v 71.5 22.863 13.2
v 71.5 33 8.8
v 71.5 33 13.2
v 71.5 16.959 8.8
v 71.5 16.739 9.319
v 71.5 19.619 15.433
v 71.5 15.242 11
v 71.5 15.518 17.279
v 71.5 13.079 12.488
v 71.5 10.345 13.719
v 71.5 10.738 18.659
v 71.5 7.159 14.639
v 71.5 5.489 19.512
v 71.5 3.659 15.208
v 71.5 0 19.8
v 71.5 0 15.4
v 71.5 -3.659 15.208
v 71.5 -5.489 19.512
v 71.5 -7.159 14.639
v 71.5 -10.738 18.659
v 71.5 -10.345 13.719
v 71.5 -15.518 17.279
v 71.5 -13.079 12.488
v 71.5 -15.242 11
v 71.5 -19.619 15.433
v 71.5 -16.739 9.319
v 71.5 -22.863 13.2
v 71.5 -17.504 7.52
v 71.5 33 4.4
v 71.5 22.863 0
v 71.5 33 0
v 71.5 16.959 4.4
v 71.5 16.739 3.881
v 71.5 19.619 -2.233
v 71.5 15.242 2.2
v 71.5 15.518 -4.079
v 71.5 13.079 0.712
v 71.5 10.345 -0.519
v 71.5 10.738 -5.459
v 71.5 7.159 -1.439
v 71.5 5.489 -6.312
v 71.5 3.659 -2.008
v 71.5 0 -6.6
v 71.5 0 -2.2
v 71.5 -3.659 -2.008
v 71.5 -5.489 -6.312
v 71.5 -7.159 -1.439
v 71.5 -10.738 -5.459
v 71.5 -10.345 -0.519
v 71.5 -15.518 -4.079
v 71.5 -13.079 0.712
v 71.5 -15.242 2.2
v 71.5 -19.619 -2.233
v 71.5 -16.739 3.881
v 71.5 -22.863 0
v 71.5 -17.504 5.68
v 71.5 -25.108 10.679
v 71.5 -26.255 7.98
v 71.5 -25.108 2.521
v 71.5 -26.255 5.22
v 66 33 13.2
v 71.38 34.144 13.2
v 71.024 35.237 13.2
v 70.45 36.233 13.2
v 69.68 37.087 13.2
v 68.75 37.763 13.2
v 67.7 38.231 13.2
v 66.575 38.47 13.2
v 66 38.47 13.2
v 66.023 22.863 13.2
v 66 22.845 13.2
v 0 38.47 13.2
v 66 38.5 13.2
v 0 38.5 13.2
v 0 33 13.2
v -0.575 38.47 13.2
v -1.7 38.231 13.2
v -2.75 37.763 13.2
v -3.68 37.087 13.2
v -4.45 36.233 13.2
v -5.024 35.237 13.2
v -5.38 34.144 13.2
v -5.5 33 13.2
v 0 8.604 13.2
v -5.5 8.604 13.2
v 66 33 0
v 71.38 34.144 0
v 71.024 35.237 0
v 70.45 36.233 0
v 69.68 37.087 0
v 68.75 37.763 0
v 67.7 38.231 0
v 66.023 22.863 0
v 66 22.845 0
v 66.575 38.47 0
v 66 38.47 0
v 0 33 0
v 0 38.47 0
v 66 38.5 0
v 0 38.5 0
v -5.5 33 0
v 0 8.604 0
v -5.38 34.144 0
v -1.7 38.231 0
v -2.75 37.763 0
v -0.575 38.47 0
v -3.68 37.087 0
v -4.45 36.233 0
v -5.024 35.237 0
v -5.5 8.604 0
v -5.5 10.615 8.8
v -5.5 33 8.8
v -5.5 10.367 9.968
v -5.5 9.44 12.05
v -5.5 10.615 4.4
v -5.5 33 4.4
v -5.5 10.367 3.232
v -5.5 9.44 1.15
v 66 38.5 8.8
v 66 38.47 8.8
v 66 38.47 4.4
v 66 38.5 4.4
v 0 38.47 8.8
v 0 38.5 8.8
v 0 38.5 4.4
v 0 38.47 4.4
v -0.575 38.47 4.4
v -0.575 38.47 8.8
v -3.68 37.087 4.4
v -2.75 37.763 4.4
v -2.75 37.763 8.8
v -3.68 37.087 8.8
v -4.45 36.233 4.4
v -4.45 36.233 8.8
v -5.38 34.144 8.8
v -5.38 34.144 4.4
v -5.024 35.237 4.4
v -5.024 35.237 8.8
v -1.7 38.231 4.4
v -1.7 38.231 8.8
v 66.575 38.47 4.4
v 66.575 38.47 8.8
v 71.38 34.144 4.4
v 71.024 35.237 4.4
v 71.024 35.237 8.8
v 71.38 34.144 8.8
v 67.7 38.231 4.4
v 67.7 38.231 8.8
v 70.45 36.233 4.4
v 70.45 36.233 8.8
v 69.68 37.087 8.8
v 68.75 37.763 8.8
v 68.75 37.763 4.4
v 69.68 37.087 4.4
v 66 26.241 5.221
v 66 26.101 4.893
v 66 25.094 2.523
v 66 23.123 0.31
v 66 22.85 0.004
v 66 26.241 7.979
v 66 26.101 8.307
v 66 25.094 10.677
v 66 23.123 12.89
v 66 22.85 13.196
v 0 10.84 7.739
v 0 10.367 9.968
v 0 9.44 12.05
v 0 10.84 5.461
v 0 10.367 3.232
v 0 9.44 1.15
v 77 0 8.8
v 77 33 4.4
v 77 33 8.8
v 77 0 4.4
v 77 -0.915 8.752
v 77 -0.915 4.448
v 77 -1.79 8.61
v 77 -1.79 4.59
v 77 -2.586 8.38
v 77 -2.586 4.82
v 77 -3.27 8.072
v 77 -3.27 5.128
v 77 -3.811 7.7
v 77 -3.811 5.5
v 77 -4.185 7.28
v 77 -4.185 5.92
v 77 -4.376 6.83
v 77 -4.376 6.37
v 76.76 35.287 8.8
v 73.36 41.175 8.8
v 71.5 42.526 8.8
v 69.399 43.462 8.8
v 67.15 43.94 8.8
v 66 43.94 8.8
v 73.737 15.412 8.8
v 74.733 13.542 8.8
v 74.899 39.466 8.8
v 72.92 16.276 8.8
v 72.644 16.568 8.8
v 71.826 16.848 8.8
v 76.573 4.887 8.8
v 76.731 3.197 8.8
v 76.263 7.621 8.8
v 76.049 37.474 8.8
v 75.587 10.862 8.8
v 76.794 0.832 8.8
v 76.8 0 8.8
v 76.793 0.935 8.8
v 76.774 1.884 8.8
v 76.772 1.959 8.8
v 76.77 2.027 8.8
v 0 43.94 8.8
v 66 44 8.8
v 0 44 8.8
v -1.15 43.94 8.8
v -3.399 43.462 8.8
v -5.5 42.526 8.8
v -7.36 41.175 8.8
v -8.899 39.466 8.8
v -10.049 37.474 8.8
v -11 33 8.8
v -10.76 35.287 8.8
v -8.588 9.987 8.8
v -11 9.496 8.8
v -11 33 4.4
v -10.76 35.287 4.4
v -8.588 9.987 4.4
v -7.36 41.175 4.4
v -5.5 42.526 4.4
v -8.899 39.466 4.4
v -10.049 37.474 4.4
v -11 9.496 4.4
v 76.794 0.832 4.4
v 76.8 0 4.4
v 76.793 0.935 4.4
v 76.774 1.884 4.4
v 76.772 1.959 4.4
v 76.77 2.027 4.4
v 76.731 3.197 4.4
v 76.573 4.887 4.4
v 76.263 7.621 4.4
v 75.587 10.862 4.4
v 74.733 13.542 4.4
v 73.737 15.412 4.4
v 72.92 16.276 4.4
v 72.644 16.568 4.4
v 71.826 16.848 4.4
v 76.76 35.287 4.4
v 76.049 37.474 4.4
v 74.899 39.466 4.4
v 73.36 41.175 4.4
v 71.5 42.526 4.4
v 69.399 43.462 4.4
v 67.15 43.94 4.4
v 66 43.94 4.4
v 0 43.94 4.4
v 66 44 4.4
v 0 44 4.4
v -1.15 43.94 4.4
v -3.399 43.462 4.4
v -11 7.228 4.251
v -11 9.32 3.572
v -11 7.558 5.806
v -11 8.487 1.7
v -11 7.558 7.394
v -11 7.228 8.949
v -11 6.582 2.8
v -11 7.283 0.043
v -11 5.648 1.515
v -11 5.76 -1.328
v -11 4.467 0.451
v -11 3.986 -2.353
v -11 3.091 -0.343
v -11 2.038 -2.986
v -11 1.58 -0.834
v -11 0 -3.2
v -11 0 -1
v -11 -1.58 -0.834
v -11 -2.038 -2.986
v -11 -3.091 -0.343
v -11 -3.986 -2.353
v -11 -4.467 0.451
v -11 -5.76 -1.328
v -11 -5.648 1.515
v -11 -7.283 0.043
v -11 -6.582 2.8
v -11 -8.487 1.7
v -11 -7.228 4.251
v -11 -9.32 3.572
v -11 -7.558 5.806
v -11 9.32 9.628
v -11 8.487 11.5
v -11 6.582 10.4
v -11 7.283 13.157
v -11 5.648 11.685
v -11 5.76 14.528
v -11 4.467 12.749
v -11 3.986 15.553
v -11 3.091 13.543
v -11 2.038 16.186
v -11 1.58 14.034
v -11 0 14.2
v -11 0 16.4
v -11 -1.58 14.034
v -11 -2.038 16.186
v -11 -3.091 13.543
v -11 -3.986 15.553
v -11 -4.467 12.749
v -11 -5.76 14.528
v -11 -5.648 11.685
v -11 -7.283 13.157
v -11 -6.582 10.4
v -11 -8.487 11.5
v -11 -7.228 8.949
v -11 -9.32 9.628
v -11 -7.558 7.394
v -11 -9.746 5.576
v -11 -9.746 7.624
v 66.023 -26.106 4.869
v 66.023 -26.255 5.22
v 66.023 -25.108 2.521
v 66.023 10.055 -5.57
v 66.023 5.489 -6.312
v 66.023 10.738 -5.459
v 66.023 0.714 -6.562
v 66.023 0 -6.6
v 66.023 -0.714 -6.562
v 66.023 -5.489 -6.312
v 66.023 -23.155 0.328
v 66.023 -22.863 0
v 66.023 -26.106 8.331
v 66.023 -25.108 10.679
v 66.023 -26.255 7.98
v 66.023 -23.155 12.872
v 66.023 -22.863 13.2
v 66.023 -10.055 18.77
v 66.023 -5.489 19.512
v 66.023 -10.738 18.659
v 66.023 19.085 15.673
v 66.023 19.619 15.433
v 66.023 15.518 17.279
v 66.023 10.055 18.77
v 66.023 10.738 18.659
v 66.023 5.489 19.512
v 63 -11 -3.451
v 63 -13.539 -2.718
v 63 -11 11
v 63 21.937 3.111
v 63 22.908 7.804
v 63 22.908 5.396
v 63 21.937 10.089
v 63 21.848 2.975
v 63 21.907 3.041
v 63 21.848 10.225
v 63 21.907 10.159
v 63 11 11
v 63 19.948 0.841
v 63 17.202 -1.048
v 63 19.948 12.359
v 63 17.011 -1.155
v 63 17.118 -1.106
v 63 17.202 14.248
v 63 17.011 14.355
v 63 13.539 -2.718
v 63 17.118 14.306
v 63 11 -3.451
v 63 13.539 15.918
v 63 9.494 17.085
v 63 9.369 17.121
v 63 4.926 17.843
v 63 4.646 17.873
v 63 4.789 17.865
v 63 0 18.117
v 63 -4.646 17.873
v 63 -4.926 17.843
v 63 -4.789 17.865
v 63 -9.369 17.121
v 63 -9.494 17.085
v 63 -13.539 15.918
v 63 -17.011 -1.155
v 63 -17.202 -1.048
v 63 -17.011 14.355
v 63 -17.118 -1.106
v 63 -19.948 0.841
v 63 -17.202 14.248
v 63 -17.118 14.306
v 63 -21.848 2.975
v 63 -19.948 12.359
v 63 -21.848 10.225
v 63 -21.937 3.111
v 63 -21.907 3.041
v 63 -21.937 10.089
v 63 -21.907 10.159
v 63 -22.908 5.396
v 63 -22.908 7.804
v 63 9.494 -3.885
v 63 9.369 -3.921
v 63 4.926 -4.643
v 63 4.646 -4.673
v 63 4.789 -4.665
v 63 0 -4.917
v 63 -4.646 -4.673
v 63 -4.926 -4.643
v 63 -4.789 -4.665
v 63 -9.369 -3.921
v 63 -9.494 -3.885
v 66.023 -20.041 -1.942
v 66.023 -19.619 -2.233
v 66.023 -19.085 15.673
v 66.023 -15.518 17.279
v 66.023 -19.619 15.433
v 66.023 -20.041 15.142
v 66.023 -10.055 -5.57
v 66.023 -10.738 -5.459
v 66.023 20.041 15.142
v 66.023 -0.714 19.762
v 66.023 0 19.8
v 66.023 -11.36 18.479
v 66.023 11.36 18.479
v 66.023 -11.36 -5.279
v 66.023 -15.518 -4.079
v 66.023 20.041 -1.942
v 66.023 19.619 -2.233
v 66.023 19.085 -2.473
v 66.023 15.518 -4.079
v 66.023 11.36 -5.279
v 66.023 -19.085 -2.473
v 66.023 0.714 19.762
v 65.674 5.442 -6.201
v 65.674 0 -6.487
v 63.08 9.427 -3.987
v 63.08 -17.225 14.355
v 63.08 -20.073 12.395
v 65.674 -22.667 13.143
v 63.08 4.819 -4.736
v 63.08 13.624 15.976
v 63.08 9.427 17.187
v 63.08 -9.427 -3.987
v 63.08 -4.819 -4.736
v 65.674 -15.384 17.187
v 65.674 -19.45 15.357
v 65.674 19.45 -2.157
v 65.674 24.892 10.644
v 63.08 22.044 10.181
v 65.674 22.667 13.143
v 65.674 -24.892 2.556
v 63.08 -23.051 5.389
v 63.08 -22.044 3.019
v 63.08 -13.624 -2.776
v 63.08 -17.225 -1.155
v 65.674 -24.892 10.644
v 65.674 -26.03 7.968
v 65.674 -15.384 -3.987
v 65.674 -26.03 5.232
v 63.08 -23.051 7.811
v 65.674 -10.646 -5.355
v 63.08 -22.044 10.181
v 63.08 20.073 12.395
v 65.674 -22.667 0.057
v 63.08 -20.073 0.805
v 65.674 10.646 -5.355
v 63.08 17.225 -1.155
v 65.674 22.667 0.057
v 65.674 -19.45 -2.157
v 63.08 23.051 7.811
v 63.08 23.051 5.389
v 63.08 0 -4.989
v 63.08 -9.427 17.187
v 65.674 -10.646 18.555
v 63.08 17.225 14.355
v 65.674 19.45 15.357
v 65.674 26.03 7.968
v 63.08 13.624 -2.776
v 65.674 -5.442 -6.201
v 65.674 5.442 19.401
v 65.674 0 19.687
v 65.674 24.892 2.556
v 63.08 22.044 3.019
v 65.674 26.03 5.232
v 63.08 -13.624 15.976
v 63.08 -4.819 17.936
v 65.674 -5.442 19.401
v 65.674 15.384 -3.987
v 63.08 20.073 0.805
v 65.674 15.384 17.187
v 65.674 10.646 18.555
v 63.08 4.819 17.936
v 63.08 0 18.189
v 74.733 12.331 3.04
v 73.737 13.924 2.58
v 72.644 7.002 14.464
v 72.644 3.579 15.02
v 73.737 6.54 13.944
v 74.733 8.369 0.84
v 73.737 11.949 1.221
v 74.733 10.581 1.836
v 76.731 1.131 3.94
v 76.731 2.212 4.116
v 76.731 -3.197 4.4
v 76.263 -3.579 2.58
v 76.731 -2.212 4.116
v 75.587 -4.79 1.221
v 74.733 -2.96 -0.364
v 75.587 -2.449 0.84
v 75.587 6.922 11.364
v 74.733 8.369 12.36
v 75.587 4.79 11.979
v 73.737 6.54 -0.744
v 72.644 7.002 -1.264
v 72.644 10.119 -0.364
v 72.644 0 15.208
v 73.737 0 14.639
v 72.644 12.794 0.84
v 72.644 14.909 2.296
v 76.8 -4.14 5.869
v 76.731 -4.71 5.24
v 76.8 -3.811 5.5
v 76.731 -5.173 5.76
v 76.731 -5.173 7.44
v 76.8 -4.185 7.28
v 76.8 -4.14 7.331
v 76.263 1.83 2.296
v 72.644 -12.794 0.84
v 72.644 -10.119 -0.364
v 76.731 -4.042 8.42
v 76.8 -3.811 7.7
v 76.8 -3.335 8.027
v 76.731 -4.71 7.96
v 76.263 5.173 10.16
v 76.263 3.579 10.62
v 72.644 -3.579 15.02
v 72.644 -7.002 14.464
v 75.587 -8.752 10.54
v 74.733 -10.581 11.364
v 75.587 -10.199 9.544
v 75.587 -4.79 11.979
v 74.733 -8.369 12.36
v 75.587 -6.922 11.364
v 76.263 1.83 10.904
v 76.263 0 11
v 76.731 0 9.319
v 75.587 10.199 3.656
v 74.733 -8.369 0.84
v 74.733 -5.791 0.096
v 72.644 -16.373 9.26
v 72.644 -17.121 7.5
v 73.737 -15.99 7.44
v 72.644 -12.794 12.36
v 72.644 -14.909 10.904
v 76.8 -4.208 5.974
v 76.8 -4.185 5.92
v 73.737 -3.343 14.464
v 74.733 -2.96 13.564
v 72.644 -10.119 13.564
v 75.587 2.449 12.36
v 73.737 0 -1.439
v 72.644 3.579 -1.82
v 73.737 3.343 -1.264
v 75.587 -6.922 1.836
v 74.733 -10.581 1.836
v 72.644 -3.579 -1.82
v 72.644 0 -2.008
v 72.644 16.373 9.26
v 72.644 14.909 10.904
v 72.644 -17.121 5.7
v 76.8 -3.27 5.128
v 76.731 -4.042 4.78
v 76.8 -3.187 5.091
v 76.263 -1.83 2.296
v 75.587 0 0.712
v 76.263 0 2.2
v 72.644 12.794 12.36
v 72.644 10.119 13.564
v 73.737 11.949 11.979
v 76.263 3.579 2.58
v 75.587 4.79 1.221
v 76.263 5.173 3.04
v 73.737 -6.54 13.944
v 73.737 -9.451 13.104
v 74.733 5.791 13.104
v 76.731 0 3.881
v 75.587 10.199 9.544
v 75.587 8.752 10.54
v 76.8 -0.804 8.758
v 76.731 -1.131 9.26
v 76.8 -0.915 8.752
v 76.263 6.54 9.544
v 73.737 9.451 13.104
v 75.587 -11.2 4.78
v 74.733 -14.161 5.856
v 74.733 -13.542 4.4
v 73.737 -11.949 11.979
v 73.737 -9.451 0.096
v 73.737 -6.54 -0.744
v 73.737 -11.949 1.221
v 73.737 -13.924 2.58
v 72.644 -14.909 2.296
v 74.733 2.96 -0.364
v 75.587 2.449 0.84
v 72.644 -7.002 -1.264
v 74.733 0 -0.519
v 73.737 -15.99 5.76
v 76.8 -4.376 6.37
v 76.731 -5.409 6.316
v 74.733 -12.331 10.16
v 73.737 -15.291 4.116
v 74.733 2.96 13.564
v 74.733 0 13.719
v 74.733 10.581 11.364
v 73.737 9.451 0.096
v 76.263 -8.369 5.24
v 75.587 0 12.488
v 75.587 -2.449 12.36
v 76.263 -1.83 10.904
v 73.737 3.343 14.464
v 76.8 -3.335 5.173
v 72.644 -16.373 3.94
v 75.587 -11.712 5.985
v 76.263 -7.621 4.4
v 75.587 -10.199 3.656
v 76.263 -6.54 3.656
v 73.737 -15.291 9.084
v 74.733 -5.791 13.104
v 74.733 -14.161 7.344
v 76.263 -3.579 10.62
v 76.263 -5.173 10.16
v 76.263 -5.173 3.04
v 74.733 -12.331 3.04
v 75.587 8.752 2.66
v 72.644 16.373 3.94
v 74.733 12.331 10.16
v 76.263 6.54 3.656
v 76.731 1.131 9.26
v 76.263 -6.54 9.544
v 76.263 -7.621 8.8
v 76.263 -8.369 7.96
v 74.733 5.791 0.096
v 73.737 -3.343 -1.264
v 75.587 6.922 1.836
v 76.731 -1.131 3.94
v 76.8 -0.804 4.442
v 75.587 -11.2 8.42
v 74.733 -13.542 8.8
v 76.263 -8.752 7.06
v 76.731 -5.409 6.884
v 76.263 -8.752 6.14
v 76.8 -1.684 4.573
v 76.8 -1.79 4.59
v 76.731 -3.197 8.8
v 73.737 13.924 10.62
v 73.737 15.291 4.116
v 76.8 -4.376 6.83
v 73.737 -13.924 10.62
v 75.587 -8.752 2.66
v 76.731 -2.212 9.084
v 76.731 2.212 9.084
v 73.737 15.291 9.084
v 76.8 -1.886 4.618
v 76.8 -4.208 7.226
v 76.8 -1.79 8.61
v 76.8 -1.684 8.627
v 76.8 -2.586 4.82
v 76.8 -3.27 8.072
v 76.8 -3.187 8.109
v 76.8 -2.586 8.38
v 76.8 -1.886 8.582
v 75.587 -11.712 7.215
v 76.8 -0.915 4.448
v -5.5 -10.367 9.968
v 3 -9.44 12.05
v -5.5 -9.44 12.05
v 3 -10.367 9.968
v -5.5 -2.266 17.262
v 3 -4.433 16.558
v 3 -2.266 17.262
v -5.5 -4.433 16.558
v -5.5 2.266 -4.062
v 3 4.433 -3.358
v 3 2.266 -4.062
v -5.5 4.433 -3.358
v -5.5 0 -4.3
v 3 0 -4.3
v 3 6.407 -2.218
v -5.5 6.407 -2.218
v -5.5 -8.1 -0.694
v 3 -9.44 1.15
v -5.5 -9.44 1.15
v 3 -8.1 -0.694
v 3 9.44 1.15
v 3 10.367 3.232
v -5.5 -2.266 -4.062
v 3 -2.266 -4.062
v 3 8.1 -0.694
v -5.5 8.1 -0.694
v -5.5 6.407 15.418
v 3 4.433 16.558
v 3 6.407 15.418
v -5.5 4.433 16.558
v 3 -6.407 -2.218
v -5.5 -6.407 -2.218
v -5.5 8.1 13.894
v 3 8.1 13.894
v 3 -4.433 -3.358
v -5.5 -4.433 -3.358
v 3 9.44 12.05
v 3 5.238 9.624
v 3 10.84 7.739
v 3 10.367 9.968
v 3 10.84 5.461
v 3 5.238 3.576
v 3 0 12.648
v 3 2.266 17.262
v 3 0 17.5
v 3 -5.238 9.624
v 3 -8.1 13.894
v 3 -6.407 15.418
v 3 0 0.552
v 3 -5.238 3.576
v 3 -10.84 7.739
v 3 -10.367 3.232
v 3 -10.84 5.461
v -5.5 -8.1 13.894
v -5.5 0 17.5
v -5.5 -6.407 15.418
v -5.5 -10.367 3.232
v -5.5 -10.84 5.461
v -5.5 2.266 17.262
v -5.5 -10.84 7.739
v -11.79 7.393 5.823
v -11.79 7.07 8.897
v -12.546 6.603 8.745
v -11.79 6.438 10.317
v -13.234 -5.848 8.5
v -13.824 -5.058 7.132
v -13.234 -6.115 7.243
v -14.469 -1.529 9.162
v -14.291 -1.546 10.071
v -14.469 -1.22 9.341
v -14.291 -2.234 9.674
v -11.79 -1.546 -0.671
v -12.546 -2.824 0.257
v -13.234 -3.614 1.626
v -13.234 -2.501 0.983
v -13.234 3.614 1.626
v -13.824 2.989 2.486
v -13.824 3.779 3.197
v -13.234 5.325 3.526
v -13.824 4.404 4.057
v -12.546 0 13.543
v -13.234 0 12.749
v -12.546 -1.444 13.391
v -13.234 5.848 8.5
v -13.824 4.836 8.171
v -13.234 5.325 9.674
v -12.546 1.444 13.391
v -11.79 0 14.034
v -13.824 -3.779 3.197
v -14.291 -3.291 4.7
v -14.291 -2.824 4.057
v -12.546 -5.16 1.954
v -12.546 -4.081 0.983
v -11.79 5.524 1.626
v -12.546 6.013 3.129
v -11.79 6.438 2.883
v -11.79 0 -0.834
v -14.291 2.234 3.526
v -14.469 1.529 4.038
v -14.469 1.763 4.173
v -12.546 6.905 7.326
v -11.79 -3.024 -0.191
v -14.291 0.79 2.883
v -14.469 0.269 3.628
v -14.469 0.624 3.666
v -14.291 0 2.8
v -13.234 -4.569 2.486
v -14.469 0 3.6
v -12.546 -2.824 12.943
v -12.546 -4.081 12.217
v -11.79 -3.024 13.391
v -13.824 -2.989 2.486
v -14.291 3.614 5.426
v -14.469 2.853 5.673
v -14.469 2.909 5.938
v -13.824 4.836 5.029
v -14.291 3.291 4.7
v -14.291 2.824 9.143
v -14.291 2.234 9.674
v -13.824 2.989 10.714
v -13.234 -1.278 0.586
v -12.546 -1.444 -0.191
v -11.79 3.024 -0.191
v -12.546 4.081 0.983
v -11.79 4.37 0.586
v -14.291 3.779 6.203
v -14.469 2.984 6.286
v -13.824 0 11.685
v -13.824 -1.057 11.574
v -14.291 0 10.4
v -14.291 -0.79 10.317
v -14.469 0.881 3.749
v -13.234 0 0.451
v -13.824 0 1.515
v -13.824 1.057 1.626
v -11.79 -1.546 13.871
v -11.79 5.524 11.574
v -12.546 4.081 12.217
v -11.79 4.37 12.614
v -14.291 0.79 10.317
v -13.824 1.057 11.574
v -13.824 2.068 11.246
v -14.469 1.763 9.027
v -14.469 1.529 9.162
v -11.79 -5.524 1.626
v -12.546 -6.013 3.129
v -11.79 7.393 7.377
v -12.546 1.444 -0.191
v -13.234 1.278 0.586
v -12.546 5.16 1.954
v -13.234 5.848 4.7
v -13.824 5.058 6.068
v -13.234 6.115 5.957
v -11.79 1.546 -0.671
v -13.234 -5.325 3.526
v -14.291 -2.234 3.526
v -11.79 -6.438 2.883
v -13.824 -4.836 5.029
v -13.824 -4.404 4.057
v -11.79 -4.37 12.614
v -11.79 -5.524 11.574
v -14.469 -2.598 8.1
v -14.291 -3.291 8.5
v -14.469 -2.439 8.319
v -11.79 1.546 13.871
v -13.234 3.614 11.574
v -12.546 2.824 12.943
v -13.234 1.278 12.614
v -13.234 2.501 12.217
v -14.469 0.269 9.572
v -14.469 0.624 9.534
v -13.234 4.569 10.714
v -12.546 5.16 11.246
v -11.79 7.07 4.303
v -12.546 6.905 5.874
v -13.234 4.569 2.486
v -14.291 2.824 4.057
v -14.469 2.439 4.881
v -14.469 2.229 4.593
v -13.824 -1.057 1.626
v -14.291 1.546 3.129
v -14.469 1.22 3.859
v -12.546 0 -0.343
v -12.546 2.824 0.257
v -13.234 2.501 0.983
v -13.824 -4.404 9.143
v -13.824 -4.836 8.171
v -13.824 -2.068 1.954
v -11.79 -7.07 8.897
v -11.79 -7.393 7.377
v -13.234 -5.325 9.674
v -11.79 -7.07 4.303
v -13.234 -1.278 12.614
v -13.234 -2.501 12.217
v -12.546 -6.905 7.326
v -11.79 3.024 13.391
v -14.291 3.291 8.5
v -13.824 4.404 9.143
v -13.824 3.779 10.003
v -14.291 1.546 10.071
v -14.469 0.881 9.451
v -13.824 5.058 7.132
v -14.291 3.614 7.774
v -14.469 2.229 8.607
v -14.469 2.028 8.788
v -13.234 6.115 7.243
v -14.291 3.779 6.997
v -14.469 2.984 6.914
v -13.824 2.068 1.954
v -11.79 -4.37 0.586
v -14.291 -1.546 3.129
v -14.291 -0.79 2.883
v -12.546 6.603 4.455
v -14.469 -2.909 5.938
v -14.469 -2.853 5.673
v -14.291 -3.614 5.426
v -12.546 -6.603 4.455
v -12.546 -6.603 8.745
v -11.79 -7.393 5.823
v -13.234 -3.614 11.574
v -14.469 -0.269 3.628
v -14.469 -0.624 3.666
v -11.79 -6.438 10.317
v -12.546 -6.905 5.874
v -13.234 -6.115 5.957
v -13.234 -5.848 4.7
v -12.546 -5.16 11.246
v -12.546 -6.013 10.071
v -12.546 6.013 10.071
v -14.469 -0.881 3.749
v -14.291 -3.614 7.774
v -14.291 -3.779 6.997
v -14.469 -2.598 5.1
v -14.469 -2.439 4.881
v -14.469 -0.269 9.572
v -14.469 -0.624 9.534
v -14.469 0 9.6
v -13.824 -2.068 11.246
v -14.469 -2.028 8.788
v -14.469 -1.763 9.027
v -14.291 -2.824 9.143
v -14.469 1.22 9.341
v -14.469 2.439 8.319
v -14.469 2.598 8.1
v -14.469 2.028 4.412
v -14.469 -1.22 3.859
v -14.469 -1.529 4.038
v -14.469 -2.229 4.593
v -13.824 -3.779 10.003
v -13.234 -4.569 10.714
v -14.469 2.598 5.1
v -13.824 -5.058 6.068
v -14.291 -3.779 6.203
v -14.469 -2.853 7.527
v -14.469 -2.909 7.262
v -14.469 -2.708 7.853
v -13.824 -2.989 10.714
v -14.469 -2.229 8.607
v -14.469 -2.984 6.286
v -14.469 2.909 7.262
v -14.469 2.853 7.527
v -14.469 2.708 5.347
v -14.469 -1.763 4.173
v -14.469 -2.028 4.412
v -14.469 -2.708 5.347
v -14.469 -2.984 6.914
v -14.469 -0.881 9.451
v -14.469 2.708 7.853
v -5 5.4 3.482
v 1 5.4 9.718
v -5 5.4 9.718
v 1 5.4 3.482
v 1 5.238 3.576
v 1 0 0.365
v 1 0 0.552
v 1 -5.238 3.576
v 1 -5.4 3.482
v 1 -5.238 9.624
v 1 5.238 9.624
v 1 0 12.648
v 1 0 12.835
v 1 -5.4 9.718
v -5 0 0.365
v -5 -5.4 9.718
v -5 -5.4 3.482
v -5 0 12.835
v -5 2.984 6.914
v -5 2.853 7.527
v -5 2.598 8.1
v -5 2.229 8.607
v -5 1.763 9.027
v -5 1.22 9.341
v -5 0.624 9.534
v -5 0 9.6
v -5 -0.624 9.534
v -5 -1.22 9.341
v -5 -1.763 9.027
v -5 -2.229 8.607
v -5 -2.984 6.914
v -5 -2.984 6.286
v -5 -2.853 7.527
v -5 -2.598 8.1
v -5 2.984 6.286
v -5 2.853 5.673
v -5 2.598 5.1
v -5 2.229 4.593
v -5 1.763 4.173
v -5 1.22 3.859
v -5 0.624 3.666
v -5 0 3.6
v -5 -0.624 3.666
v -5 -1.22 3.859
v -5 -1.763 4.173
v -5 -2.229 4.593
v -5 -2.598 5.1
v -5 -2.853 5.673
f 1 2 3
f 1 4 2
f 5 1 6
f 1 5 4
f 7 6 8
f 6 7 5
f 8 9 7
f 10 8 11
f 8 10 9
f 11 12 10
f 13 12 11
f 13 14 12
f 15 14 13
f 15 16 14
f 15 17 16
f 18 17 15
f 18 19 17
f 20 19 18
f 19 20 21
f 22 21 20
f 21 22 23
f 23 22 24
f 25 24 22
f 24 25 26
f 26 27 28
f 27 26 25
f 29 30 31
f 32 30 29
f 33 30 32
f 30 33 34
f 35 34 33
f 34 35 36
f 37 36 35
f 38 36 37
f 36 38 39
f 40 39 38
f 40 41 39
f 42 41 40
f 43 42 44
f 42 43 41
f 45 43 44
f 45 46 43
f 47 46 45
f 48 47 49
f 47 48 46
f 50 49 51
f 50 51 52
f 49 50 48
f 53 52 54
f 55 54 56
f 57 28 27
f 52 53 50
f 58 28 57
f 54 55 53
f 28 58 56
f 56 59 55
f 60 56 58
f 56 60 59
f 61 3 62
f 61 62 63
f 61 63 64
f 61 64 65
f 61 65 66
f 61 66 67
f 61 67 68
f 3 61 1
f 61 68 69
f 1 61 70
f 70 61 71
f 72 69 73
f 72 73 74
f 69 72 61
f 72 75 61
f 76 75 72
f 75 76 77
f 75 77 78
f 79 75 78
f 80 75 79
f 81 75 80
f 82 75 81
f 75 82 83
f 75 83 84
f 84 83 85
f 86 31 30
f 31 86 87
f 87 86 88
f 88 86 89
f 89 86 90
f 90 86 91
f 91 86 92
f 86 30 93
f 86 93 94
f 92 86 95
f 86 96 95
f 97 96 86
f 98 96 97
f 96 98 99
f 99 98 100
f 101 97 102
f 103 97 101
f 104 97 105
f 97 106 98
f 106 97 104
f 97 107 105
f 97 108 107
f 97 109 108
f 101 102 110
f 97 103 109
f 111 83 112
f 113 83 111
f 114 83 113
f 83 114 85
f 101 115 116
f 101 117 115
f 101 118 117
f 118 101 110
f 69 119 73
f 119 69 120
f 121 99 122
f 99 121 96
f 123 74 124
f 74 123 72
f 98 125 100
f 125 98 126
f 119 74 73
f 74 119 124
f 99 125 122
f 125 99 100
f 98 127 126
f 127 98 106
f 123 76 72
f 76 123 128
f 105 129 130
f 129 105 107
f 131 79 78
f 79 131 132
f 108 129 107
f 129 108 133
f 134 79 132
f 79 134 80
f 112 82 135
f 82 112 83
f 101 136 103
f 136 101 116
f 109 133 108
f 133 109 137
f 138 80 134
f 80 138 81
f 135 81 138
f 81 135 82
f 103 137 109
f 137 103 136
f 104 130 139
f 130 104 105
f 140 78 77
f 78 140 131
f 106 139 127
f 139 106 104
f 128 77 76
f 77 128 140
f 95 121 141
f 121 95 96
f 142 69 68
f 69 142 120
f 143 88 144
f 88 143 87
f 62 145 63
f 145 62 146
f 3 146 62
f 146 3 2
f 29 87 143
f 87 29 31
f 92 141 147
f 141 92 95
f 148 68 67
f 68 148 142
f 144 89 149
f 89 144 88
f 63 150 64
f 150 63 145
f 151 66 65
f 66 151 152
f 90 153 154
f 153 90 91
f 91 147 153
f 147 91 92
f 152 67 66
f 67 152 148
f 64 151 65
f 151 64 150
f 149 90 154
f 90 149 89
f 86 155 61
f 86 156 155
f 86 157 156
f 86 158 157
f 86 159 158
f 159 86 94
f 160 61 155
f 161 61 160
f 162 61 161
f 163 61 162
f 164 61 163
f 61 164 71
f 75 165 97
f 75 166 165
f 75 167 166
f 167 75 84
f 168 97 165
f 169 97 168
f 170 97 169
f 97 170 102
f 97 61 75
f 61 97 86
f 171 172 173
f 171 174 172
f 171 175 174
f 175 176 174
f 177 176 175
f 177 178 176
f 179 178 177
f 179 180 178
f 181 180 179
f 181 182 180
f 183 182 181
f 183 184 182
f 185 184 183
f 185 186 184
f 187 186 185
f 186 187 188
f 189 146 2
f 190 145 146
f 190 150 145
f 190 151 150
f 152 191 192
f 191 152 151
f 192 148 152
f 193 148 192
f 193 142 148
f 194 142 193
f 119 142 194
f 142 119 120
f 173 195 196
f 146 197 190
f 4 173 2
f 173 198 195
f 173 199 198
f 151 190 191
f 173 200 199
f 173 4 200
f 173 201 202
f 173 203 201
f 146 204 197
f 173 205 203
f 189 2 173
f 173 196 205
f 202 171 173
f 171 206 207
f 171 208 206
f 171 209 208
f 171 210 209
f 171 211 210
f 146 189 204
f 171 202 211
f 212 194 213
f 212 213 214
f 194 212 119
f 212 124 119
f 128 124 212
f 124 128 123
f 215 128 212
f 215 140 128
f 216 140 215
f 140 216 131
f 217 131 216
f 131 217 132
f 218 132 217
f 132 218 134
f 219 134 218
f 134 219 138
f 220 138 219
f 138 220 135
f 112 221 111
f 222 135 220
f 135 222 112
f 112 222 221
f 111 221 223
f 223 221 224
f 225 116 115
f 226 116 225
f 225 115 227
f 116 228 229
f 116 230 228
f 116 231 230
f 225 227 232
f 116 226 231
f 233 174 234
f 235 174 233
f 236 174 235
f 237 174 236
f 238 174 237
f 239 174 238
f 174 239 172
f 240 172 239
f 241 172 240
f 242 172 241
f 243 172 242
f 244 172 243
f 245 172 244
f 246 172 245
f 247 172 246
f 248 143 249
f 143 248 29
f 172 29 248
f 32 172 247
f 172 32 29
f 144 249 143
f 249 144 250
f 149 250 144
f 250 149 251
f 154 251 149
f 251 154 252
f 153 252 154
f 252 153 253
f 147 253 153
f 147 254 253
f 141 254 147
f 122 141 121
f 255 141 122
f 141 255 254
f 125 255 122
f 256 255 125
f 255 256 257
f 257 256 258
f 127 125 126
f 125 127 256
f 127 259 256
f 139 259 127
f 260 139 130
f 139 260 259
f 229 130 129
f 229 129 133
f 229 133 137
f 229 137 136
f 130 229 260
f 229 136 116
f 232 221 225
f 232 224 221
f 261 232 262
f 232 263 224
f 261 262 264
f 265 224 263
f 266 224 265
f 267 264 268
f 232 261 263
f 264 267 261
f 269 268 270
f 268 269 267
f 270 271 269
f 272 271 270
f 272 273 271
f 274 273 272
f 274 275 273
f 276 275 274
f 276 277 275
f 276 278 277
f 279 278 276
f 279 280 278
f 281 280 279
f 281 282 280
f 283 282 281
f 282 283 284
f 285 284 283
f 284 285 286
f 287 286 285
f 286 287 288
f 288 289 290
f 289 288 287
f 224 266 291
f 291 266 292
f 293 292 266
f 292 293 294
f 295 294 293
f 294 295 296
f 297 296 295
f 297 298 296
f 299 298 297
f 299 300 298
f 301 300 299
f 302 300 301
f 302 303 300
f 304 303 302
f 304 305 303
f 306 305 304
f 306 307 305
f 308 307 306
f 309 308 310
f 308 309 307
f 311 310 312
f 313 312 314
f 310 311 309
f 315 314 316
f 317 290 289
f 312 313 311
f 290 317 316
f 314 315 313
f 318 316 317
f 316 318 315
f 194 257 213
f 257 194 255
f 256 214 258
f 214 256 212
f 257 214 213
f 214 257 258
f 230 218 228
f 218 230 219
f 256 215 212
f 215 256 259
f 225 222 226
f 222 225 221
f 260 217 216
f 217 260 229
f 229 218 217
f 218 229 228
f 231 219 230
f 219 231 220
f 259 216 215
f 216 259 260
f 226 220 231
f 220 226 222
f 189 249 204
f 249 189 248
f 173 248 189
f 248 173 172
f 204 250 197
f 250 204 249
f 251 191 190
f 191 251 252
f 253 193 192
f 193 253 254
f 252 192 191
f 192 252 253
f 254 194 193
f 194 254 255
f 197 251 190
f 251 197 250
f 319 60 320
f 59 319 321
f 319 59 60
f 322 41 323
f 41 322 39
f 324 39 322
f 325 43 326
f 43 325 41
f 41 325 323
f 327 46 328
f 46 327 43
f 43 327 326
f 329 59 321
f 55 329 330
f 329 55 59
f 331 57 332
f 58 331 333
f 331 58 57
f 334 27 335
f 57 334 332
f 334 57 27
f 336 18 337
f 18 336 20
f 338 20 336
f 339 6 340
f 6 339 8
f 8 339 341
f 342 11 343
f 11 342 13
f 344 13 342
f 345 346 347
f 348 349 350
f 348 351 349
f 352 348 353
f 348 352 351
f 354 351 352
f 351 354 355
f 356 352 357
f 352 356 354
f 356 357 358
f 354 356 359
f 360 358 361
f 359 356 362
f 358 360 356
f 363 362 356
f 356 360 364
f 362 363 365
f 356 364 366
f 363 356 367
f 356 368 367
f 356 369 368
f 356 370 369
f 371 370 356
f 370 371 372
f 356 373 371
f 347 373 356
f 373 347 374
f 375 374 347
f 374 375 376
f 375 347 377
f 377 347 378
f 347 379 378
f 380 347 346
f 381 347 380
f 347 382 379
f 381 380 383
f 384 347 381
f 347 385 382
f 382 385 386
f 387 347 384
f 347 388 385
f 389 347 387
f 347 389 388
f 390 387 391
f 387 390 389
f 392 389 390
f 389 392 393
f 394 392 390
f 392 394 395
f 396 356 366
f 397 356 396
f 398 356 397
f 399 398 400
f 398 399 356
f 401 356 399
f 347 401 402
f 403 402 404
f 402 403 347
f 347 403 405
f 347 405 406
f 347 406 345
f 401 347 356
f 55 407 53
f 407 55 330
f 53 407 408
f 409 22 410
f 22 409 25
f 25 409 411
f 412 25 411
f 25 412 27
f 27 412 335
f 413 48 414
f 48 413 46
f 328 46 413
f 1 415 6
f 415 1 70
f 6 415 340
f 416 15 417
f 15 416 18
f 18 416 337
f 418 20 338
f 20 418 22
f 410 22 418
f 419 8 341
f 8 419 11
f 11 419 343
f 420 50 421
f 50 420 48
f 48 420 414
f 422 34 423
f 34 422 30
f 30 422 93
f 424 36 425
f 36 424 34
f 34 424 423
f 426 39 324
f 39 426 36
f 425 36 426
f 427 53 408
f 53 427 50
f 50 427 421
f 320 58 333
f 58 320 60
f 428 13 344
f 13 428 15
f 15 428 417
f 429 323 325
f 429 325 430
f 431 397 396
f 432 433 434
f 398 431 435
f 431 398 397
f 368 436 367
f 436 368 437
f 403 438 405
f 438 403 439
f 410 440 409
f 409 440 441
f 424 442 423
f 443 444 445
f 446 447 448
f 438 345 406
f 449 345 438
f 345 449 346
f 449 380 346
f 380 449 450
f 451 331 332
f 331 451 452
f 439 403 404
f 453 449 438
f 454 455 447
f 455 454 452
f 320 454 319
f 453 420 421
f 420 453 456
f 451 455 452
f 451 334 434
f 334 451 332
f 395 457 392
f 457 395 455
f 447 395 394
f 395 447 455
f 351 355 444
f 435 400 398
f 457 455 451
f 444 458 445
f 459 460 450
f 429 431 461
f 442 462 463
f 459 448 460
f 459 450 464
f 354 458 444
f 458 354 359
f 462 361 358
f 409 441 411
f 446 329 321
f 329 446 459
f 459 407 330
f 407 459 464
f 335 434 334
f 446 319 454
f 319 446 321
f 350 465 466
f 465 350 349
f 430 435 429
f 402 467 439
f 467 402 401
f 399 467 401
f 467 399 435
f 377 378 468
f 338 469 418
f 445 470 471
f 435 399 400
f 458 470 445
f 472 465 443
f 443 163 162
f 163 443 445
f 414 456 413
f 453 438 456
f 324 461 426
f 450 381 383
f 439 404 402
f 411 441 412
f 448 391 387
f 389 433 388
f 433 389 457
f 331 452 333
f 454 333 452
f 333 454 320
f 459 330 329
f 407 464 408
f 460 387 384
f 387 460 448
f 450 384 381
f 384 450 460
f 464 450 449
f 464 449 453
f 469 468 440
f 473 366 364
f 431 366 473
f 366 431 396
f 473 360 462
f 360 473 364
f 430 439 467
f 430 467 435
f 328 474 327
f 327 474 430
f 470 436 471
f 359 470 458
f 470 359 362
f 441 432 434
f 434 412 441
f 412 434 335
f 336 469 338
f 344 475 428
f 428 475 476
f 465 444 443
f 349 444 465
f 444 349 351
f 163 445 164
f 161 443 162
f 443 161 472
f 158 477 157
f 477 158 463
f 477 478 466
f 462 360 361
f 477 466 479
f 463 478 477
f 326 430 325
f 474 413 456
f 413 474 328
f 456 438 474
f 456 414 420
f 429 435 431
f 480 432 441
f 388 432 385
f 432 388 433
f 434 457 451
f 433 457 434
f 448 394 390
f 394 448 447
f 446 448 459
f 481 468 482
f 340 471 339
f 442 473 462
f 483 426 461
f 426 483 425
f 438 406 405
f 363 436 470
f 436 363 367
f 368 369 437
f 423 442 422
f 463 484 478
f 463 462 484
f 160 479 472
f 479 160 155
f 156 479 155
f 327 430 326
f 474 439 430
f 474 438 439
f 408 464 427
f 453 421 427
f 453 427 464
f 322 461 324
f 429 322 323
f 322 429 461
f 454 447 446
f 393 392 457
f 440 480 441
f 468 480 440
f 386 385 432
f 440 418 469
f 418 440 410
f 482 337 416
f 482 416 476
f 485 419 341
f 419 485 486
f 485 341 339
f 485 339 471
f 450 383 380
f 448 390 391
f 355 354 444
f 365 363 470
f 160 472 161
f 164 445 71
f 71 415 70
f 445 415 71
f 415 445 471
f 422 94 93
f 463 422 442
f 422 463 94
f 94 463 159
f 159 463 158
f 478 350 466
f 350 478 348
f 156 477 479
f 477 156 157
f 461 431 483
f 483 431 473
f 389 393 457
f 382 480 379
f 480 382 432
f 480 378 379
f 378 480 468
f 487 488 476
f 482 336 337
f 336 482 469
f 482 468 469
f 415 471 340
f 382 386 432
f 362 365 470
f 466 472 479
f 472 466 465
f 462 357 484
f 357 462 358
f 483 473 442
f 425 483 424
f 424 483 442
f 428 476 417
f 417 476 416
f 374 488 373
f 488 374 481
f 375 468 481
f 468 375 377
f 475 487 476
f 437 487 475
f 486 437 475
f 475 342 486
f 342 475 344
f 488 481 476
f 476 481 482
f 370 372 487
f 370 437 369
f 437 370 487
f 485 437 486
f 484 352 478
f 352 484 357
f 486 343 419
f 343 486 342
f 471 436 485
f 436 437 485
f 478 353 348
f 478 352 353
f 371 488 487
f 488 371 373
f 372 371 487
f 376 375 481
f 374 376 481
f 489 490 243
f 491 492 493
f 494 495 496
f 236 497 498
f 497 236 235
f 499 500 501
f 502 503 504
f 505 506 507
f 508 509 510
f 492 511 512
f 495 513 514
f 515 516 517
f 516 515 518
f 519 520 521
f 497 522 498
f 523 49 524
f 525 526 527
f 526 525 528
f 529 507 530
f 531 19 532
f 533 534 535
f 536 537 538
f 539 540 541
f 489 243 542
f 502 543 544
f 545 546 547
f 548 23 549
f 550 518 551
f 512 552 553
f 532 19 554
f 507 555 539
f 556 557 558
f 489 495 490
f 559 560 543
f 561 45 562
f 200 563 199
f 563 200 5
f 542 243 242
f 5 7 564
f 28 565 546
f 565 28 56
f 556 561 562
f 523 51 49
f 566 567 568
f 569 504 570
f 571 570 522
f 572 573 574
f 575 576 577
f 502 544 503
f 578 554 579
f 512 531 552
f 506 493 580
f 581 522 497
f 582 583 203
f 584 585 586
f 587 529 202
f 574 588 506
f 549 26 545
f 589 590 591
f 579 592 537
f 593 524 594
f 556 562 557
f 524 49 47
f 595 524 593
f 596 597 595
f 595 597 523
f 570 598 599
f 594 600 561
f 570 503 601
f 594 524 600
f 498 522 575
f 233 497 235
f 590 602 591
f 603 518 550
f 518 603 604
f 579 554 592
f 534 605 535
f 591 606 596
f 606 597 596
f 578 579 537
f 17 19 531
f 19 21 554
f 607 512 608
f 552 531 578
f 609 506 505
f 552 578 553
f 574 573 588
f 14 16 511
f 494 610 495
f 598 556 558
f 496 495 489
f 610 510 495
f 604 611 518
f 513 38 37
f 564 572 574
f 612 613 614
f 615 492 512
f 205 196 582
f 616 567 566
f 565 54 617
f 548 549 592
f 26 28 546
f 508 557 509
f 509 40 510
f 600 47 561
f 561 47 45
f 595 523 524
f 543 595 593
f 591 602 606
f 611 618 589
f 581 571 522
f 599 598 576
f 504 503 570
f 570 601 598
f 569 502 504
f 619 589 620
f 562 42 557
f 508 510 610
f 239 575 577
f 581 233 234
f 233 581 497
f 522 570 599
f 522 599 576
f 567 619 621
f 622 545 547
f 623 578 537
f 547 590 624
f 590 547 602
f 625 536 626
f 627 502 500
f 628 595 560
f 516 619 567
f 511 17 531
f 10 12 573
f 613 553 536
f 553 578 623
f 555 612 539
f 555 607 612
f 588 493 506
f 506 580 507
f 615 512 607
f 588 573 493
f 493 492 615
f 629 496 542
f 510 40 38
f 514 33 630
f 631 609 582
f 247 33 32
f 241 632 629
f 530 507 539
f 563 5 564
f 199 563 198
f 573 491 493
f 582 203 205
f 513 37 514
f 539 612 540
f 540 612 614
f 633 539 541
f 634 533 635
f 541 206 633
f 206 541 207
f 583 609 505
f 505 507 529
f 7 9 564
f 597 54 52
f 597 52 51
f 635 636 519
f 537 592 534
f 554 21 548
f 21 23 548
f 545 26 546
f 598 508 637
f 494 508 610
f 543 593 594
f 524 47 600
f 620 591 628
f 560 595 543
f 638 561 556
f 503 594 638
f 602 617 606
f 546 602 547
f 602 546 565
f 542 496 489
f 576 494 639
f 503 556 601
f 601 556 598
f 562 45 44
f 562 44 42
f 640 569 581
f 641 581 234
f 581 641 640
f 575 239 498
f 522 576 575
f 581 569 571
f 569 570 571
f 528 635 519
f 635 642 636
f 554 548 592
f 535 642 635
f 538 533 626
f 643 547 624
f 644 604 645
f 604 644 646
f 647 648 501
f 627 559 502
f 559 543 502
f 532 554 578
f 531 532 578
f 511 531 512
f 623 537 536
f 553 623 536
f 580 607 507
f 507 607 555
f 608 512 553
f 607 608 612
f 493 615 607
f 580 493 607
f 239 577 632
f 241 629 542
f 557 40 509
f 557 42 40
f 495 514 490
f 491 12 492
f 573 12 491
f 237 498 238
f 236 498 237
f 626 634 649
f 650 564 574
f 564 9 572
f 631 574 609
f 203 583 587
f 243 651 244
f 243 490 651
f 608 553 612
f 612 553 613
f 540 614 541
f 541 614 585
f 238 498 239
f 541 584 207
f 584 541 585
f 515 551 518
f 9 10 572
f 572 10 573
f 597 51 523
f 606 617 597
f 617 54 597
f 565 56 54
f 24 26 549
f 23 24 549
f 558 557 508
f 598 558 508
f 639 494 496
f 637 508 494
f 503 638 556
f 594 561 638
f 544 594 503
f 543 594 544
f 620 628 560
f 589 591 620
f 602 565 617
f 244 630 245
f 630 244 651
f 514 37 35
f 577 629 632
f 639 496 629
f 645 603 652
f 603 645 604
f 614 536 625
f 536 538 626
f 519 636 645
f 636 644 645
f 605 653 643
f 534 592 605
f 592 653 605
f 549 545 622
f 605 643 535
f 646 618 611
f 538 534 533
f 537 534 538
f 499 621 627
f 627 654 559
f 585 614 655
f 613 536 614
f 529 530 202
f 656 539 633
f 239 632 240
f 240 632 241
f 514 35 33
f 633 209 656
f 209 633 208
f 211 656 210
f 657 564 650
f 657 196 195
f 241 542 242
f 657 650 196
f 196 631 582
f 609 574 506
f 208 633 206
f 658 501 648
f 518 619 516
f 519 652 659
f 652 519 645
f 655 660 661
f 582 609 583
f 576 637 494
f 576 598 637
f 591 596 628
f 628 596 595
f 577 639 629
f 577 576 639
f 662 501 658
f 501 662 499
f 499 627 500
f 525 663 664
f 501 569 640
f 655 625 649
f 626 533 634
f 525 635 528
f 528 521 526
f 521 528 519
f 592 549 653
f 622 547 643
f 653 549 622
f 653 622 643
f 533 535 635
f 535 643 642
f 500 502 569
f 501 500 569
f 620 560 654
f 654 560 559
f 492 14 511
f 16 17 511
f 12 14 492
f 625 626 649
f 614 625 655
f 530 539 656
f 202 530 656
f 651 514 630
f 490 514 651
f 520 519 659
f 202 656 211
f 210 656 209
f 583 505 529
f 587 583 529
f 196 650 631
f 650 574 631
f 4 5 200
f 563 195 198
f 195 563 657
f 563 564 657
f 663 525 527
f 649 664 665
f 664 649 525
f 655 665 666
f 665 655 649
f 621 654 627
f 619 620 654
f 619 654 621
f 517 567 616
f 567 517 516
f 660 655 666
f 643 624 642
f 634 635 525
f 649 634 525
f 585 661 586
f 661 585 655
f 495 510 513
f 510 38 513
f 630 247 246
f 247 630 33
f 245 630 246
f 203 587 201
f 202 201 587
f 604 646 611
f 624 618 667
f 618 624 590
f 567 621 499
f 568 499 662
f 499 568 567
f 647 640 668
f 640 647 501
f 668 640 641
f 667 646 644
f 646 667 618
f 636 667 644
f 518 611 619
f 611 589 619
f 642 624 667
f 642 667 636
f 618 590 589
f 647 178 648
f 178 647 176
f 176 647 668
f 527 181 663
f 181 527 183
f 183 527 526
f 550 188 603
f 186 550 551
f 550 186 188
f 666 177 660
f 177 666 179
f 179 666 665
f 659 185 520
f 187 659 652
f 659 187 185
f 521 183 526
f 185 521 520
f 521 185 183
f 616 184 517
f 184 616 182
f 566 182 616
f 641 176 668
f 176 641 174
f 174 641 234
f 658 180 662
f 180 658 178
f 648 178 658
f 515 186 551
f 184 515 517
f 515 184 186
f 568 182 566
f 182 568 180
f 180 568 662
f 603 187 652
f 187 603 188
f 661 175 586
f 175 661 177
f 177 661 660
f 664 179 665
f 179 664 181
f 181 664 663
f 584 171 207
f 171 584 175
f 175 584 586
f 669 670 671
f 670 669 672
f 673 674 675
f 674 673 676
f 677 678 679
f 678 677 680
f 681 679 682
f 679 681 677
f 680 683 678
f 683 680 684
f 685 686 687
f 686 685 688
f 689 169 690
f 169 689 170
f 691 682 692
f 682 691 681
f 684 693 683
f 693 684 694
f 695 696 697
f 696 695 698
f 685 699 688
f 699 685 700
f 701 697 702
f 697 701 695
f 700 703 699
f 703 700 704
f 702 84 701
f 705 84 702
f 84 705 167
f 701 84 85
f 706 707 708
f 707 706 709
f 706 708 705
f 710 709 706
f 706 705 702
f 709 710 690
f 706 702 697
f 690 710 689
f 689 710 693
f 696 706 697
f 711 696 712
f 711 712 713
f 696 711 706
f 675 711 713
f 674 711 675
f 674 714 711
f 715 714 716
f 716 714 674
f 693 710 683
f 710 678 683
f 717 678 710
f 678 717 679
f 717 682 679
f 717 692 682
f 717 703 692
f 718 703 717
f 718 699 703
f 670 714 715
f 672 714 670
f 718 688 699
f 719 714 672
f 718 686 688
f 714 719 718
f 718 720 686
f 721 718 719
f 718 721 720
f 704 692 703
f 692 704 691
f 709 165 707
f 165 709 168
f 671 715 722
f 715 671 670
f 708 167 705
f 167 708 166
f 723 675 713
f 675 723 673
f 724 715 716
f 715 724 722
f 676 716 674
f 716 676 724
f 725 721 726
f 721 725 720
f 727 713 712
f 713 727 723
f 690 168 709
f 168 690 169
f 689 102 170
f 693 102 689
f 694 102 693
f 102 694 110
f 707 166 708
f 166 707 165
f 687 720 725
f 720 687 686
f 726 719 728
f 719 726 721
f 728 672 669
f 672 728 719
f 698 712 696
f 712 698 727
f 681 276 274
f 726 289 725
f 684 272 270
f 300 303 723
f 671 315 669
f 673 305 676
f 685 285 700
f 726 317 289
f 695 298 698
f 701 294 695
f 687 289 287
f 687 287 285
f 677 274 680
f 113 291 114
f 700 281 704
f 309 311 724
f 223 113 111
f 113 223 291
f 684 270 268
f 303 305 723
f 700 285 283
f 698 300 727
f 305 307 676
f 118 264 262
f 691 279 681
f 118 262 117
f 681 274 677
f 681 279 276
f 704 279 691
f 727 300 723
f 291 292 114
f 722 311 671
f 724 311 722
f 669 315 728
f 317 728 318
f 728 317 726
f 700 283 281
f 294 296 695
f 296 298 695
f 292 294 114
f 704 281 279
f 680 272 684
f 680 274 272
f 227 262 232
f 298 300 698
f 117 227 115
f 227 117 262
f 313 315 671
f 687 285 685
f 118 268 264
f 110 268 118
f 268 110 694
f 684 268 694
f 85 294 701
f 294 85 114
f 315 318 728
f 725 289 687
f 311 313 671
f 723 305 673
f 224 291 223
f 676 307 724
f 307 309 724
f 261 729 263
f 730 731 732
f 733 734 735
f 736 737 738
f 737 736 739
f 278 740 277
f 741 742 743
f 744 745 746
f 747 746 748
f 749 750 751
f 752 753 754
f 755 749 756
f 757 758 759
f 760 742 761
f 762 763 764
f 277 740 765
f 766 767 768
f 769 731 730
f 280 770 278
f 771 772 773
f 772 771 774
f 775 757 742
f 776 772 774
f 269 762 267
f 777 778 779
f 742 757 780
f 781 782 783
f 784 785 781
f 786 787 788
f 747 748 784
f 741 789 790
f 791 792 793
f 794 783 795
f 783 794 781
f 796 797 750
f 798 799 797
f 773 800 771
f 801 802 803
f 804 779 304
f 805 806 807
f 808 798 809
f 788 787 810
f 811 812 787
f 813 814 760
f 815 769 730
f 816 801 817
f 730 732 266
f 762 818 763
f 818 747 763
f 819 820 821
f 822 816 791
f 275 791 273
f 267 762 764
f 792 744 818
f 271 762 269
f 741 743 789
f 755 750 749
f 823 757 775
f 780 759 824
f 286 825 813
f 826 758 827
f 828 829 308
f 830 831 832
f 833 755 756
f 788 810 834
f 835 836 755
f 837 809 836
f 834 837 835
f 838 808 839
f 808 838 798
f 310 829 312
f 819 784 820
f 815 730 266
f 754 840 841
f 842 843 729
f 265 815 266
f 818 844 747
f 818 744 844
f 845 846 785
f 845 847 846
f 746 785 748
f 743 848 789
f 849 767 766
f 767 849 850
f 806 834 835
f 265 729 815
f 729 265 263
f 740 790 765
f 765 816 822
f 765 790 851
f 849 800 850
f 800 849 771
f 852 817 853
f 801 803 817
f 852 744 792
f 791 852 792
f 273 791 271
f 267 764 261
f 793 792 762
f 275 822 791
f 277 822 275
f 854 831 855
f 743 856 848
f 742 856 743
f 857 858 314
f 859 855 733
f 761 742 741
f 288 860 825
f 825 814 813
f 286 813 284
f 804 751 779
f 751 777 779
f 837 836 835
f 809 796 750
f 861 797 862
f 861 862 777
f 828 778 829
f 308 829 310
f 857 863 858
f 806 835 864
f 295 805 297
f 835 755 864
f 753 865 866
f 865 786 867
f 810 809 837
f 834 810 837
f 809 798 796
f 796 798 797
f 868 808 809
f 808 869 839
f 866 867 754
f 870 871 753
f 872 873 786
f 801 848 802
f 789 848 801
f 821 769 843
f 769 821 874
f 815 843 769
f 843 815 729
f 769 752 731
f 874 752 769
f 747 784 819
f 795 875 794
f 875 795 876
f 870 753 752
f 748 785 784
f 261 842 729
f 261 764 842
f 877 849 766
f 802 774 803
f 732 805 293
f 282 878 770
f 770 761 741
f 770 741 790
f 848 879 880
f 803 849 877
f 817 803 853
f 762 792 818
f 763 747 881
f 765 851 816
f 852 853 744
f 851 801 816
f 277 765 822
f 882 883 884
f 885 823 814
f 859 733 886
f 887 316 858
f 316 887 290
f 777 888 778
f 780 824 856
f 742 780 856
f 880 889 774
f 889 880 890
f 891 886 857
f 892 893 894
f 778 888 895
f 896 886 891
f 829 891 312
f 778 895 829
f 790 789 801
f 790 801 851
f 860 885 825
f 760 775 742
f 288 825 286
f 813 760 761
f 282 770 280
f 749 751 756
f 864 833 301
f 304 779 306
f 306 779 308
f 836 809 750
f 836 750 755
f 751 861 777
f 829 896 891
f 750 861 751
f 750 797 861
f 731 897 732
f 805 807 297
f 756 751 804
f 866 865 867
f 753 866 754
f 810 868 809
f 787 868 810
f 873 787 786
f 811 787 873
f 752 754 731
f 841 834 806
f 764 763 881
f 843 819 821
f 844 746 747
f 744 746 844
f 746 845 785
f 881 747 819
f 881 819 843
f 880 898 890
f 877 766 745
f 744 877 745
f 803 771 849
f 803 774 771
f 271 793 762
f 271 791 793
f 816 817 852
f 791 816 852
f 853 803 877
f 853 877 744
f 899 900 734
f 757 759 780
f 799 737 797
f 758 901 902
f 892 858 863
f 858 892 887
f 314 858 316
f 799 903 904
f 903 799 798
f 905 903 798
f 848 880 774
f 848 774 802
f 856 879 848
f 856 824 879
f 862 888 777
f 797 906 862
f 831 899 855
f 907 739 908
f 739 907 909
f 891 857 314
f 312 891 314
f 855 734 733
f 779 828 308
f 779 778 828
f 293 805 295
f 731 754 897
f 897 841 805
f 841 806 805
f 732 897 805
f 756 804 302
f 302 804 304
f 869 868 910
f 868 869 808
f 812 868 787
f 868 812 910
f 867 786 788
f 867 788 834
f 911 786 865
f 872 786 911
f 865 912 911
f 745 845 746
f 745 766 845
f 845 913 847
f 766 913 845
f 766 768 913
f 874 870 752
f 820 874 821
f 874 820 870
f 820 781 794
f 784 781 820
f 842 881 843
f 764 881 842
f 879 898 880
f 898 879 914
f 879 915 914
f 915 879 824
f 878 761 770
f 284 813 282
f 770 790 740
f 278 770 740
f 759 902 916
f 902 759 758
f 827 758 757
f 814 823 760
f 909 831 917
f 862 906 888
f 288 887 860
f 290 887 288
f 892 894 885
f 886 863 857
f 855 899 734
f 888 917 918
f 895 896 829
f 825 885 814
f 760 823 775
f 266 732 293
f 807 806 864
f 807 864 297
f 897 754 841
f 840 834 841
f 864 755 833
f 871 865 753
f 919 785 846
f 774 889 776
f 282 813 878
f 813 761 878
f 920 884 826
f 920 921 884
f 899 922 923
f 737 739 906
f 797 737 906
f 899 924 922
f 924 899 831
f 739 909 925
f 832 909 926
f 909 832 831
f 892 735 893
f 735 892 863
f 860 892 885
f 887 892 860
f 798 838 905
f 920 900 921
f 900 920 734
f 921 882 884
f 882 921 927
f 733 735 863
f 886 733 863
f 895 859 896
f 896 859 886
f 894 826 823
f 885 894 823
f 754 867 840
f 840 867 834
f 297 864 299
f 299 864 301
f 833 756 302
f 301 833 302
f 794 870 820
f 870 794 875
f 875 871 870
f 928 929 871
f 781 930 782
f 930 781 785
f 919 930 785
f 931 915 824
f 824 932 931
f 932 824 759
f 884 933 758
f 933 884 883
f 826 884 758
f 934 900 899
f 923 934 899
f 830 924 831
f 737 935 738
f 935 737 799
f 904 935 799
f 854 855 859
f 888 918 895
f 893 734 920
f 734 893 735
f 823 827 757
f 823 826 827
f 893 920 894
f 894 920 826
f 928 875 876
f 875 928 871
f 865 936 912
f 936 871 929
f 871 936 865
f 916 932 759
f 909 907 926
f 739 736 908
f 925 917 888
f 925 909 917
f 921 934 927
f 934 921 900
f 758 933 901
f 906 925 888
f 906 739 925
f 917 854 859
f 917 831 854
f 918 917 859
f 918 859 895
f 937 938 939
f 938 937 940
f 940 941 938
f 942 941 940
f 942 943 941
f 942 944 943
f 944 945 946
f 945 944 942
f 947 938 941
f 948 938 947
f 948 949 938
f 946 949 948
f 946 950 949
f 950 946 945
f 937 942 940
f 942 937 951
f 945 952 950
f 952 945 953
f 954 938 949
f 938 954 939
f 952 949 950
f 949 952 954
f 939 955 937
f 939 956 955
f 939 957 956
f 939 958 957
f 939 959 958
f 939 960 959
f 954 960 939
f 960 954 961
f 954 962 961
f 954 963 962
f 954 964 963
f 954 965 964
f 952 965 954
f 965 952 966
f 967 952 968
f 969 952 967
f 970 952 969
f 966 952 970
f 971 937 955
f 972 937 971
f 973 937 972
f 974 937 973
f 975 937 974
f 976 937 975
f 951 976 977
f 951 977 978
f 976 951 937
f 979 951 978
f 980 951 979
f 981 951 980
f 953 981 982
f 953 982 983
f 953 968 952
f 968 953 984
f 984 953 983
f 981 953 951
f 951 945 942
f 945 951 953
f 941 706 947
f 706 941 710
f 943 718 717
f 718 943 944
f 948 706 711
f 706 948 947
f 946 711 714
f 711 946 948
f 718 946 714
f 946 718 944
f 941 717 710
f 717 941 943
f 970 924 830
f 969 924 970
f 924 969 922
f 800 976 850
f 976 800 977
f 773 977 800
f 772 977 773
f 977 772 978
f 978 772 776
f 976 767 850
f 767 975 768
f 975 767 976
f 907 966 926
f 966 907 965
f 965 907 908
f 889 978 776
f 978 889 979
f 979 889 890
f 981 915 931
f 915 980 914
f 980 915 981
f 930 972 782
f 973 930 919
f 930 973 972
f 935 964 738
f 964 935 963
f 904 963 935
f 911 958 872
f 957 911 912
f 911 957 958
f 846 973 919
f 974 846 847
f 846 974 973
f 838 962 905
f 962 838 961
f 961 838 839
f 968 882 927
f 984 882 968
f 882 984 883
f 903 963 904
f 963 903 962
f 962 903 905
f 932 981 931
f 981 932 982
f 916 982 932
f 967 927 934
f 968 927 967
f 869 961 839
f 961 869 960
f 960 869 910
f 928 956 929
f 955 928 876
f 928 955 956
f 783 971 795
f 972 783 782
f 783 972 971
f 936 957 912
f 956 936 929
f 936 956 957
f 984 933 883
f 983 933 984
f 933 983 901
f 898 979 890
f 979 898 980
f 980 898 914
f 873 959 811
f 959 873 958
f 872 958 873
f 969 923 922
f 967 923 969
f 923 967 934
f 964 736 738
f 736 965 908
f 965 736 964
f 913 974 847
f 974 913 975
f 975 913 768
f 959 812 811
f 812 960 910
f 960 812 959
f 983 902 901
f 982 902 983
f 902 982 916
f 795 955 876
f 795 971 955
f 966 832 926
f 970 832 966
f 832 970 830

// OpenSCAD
//
//  Copyright (C) 05-05-2013 Jasper den Ouden.
//
//  This is free software: you can redistribute it and/or modify
//  it under the terms of the GNU General Public License as published
//  by the Free Software Foundation, either version 3 of the License, or
//  (at your option) any later version.
//

//M6 x 60
l = 60; //Length of bolt
br = 6/2; //Radius of bolt

nw = 10.8; // Nut width
nh = 6; //Nut height.
hh = 5; //Head height.

hl = 30; //Handle length.(minimum of 1.1*hh+ti)

//('advanced') params.
d = 1; //Extra.

hcl = 4; //'Head capture' room.

px = 3;

el = 10;
ehl = 6; //Space for end to hang on to.
fil = l + el - ehl - hcl + 2*px;

echo(fil+2*to);

w = fil/2;

hi = fil/5;
to = fil/6;
ho = hi/3;
ti = to/2;

pa = 7; //Angle to print it at. //TODO calculate it.

$fs=0.4;

f = 0.97;

module _screw_frame(t,h)
{
    difference()
    {   union()
        {   translate([-t,0]) cube([fil+2*t,w,h]);
            cube([fil,w+t,h]);
            translate([0,w]) cylinder(r=t,h=h);
            translate([fil,w]) cylinder(r=t,h=h);
        }
        translate([0,-w,-hi]) cube([fil,2*w,3*hi]);
    }
}

module hex_hole(w)
{
    difference()//Where it goes on the big nuts.
    {   circle(w); //Hex thing
        for( a= [30:60:390] ) rotate(a) translate([w,0]) square([w,w],center=true);
    }
}

ur = nw/2; //Radius near nut.

module rodend()
{
    r2=ur+ti; //br+to;
    difference()
    {   intersection()
        {   cylinder(r=r2, h=el);
            sphere(sqrt(r2*r2 + el*el)-to/8);
        }
        cylinder(r=br, h= ehl);
    }
}

//Gah openscad fucking up again.
module frame()
{
    r_a = sqrt(hi*hi + (px+ti)*(px+ti));
    difference()
    {   union()
        {   
            _screw_frame(ti,hi);
            translate([0,0,(hi-ho)/2]) _screw_frame(to,ho);
            
            translate([fil-px,0,hi/2]) rotate([0,90,0]) scale([1,2])
            {   intersection()
                {   cylinder(r=hi,h=px+ti);
                    translate([0,0,px+ti]) sphere(r_a-to/8);
                }
                translate([0,0,px+ti]) scale([2,2,(to-ti)/ho]) sphere(ho);
                cylinder(r=ho/2, h=px+to);
            }

            translate([0,0,hi/2]) rotate([0,90,0])  //Nut end.
            {   translate([0,0,-ti]) cylinder(r=ur + ti, h= ti+px);
                translate([0,0,-to]) cylinder(r1 = ur+ho, r2 = ur+ti, h= to-ti);
                translate([0,0,-to]) scale([1,1,1/2]) sphere(ur+ho/2);
            }
        }
        
        translate([fil-px-to,0,0]) cube(to*[2,2,2],center=true);
        translate([0,0,hi/2]) rotate([0,90,0]) 
        {   translate([0,0,px-nh-hcl/2]) linear_extrude(height= nh) hex_hole(nw);
            translate([0,0,px-nh-hcl/2]) linear_extrude(height= to+nh) hex_hole(f*nw);
            
            translate([0,0,-w]) cylinder(r=br,h=2*w);
        }
        
    }
}

//Thumb wheel for it.
module thumb_wheel()
 {
    t=ti;
    h=max(hl, t+1.1*hh);
    mr = nw/2+t;
    difference()
    {   union()
        {   cylinder(r=mr, h=h-t/2);
            cylinder(r=mr/2, h=h-t/4);
            translate([0,0,h-t/2]) rotate_extrude() 
                translate([mr-t,0]) scale([1,1/2]) circle(t);
            for( a=[0:60:360] ) rotate(a) translate([nw/2+t/2,0]) 
                                {   cylinder(r=t, h=h-2*t);
                                    translate([0,0,h-2*t]) sphere(t);
                                }
        }
        translate([0,0,0.1*hh]) linear_extrude(height=nh) hex_hole(nw);
        linear_extrude(height=nh) hex_hole(f*nw);
    }
}

frame();
